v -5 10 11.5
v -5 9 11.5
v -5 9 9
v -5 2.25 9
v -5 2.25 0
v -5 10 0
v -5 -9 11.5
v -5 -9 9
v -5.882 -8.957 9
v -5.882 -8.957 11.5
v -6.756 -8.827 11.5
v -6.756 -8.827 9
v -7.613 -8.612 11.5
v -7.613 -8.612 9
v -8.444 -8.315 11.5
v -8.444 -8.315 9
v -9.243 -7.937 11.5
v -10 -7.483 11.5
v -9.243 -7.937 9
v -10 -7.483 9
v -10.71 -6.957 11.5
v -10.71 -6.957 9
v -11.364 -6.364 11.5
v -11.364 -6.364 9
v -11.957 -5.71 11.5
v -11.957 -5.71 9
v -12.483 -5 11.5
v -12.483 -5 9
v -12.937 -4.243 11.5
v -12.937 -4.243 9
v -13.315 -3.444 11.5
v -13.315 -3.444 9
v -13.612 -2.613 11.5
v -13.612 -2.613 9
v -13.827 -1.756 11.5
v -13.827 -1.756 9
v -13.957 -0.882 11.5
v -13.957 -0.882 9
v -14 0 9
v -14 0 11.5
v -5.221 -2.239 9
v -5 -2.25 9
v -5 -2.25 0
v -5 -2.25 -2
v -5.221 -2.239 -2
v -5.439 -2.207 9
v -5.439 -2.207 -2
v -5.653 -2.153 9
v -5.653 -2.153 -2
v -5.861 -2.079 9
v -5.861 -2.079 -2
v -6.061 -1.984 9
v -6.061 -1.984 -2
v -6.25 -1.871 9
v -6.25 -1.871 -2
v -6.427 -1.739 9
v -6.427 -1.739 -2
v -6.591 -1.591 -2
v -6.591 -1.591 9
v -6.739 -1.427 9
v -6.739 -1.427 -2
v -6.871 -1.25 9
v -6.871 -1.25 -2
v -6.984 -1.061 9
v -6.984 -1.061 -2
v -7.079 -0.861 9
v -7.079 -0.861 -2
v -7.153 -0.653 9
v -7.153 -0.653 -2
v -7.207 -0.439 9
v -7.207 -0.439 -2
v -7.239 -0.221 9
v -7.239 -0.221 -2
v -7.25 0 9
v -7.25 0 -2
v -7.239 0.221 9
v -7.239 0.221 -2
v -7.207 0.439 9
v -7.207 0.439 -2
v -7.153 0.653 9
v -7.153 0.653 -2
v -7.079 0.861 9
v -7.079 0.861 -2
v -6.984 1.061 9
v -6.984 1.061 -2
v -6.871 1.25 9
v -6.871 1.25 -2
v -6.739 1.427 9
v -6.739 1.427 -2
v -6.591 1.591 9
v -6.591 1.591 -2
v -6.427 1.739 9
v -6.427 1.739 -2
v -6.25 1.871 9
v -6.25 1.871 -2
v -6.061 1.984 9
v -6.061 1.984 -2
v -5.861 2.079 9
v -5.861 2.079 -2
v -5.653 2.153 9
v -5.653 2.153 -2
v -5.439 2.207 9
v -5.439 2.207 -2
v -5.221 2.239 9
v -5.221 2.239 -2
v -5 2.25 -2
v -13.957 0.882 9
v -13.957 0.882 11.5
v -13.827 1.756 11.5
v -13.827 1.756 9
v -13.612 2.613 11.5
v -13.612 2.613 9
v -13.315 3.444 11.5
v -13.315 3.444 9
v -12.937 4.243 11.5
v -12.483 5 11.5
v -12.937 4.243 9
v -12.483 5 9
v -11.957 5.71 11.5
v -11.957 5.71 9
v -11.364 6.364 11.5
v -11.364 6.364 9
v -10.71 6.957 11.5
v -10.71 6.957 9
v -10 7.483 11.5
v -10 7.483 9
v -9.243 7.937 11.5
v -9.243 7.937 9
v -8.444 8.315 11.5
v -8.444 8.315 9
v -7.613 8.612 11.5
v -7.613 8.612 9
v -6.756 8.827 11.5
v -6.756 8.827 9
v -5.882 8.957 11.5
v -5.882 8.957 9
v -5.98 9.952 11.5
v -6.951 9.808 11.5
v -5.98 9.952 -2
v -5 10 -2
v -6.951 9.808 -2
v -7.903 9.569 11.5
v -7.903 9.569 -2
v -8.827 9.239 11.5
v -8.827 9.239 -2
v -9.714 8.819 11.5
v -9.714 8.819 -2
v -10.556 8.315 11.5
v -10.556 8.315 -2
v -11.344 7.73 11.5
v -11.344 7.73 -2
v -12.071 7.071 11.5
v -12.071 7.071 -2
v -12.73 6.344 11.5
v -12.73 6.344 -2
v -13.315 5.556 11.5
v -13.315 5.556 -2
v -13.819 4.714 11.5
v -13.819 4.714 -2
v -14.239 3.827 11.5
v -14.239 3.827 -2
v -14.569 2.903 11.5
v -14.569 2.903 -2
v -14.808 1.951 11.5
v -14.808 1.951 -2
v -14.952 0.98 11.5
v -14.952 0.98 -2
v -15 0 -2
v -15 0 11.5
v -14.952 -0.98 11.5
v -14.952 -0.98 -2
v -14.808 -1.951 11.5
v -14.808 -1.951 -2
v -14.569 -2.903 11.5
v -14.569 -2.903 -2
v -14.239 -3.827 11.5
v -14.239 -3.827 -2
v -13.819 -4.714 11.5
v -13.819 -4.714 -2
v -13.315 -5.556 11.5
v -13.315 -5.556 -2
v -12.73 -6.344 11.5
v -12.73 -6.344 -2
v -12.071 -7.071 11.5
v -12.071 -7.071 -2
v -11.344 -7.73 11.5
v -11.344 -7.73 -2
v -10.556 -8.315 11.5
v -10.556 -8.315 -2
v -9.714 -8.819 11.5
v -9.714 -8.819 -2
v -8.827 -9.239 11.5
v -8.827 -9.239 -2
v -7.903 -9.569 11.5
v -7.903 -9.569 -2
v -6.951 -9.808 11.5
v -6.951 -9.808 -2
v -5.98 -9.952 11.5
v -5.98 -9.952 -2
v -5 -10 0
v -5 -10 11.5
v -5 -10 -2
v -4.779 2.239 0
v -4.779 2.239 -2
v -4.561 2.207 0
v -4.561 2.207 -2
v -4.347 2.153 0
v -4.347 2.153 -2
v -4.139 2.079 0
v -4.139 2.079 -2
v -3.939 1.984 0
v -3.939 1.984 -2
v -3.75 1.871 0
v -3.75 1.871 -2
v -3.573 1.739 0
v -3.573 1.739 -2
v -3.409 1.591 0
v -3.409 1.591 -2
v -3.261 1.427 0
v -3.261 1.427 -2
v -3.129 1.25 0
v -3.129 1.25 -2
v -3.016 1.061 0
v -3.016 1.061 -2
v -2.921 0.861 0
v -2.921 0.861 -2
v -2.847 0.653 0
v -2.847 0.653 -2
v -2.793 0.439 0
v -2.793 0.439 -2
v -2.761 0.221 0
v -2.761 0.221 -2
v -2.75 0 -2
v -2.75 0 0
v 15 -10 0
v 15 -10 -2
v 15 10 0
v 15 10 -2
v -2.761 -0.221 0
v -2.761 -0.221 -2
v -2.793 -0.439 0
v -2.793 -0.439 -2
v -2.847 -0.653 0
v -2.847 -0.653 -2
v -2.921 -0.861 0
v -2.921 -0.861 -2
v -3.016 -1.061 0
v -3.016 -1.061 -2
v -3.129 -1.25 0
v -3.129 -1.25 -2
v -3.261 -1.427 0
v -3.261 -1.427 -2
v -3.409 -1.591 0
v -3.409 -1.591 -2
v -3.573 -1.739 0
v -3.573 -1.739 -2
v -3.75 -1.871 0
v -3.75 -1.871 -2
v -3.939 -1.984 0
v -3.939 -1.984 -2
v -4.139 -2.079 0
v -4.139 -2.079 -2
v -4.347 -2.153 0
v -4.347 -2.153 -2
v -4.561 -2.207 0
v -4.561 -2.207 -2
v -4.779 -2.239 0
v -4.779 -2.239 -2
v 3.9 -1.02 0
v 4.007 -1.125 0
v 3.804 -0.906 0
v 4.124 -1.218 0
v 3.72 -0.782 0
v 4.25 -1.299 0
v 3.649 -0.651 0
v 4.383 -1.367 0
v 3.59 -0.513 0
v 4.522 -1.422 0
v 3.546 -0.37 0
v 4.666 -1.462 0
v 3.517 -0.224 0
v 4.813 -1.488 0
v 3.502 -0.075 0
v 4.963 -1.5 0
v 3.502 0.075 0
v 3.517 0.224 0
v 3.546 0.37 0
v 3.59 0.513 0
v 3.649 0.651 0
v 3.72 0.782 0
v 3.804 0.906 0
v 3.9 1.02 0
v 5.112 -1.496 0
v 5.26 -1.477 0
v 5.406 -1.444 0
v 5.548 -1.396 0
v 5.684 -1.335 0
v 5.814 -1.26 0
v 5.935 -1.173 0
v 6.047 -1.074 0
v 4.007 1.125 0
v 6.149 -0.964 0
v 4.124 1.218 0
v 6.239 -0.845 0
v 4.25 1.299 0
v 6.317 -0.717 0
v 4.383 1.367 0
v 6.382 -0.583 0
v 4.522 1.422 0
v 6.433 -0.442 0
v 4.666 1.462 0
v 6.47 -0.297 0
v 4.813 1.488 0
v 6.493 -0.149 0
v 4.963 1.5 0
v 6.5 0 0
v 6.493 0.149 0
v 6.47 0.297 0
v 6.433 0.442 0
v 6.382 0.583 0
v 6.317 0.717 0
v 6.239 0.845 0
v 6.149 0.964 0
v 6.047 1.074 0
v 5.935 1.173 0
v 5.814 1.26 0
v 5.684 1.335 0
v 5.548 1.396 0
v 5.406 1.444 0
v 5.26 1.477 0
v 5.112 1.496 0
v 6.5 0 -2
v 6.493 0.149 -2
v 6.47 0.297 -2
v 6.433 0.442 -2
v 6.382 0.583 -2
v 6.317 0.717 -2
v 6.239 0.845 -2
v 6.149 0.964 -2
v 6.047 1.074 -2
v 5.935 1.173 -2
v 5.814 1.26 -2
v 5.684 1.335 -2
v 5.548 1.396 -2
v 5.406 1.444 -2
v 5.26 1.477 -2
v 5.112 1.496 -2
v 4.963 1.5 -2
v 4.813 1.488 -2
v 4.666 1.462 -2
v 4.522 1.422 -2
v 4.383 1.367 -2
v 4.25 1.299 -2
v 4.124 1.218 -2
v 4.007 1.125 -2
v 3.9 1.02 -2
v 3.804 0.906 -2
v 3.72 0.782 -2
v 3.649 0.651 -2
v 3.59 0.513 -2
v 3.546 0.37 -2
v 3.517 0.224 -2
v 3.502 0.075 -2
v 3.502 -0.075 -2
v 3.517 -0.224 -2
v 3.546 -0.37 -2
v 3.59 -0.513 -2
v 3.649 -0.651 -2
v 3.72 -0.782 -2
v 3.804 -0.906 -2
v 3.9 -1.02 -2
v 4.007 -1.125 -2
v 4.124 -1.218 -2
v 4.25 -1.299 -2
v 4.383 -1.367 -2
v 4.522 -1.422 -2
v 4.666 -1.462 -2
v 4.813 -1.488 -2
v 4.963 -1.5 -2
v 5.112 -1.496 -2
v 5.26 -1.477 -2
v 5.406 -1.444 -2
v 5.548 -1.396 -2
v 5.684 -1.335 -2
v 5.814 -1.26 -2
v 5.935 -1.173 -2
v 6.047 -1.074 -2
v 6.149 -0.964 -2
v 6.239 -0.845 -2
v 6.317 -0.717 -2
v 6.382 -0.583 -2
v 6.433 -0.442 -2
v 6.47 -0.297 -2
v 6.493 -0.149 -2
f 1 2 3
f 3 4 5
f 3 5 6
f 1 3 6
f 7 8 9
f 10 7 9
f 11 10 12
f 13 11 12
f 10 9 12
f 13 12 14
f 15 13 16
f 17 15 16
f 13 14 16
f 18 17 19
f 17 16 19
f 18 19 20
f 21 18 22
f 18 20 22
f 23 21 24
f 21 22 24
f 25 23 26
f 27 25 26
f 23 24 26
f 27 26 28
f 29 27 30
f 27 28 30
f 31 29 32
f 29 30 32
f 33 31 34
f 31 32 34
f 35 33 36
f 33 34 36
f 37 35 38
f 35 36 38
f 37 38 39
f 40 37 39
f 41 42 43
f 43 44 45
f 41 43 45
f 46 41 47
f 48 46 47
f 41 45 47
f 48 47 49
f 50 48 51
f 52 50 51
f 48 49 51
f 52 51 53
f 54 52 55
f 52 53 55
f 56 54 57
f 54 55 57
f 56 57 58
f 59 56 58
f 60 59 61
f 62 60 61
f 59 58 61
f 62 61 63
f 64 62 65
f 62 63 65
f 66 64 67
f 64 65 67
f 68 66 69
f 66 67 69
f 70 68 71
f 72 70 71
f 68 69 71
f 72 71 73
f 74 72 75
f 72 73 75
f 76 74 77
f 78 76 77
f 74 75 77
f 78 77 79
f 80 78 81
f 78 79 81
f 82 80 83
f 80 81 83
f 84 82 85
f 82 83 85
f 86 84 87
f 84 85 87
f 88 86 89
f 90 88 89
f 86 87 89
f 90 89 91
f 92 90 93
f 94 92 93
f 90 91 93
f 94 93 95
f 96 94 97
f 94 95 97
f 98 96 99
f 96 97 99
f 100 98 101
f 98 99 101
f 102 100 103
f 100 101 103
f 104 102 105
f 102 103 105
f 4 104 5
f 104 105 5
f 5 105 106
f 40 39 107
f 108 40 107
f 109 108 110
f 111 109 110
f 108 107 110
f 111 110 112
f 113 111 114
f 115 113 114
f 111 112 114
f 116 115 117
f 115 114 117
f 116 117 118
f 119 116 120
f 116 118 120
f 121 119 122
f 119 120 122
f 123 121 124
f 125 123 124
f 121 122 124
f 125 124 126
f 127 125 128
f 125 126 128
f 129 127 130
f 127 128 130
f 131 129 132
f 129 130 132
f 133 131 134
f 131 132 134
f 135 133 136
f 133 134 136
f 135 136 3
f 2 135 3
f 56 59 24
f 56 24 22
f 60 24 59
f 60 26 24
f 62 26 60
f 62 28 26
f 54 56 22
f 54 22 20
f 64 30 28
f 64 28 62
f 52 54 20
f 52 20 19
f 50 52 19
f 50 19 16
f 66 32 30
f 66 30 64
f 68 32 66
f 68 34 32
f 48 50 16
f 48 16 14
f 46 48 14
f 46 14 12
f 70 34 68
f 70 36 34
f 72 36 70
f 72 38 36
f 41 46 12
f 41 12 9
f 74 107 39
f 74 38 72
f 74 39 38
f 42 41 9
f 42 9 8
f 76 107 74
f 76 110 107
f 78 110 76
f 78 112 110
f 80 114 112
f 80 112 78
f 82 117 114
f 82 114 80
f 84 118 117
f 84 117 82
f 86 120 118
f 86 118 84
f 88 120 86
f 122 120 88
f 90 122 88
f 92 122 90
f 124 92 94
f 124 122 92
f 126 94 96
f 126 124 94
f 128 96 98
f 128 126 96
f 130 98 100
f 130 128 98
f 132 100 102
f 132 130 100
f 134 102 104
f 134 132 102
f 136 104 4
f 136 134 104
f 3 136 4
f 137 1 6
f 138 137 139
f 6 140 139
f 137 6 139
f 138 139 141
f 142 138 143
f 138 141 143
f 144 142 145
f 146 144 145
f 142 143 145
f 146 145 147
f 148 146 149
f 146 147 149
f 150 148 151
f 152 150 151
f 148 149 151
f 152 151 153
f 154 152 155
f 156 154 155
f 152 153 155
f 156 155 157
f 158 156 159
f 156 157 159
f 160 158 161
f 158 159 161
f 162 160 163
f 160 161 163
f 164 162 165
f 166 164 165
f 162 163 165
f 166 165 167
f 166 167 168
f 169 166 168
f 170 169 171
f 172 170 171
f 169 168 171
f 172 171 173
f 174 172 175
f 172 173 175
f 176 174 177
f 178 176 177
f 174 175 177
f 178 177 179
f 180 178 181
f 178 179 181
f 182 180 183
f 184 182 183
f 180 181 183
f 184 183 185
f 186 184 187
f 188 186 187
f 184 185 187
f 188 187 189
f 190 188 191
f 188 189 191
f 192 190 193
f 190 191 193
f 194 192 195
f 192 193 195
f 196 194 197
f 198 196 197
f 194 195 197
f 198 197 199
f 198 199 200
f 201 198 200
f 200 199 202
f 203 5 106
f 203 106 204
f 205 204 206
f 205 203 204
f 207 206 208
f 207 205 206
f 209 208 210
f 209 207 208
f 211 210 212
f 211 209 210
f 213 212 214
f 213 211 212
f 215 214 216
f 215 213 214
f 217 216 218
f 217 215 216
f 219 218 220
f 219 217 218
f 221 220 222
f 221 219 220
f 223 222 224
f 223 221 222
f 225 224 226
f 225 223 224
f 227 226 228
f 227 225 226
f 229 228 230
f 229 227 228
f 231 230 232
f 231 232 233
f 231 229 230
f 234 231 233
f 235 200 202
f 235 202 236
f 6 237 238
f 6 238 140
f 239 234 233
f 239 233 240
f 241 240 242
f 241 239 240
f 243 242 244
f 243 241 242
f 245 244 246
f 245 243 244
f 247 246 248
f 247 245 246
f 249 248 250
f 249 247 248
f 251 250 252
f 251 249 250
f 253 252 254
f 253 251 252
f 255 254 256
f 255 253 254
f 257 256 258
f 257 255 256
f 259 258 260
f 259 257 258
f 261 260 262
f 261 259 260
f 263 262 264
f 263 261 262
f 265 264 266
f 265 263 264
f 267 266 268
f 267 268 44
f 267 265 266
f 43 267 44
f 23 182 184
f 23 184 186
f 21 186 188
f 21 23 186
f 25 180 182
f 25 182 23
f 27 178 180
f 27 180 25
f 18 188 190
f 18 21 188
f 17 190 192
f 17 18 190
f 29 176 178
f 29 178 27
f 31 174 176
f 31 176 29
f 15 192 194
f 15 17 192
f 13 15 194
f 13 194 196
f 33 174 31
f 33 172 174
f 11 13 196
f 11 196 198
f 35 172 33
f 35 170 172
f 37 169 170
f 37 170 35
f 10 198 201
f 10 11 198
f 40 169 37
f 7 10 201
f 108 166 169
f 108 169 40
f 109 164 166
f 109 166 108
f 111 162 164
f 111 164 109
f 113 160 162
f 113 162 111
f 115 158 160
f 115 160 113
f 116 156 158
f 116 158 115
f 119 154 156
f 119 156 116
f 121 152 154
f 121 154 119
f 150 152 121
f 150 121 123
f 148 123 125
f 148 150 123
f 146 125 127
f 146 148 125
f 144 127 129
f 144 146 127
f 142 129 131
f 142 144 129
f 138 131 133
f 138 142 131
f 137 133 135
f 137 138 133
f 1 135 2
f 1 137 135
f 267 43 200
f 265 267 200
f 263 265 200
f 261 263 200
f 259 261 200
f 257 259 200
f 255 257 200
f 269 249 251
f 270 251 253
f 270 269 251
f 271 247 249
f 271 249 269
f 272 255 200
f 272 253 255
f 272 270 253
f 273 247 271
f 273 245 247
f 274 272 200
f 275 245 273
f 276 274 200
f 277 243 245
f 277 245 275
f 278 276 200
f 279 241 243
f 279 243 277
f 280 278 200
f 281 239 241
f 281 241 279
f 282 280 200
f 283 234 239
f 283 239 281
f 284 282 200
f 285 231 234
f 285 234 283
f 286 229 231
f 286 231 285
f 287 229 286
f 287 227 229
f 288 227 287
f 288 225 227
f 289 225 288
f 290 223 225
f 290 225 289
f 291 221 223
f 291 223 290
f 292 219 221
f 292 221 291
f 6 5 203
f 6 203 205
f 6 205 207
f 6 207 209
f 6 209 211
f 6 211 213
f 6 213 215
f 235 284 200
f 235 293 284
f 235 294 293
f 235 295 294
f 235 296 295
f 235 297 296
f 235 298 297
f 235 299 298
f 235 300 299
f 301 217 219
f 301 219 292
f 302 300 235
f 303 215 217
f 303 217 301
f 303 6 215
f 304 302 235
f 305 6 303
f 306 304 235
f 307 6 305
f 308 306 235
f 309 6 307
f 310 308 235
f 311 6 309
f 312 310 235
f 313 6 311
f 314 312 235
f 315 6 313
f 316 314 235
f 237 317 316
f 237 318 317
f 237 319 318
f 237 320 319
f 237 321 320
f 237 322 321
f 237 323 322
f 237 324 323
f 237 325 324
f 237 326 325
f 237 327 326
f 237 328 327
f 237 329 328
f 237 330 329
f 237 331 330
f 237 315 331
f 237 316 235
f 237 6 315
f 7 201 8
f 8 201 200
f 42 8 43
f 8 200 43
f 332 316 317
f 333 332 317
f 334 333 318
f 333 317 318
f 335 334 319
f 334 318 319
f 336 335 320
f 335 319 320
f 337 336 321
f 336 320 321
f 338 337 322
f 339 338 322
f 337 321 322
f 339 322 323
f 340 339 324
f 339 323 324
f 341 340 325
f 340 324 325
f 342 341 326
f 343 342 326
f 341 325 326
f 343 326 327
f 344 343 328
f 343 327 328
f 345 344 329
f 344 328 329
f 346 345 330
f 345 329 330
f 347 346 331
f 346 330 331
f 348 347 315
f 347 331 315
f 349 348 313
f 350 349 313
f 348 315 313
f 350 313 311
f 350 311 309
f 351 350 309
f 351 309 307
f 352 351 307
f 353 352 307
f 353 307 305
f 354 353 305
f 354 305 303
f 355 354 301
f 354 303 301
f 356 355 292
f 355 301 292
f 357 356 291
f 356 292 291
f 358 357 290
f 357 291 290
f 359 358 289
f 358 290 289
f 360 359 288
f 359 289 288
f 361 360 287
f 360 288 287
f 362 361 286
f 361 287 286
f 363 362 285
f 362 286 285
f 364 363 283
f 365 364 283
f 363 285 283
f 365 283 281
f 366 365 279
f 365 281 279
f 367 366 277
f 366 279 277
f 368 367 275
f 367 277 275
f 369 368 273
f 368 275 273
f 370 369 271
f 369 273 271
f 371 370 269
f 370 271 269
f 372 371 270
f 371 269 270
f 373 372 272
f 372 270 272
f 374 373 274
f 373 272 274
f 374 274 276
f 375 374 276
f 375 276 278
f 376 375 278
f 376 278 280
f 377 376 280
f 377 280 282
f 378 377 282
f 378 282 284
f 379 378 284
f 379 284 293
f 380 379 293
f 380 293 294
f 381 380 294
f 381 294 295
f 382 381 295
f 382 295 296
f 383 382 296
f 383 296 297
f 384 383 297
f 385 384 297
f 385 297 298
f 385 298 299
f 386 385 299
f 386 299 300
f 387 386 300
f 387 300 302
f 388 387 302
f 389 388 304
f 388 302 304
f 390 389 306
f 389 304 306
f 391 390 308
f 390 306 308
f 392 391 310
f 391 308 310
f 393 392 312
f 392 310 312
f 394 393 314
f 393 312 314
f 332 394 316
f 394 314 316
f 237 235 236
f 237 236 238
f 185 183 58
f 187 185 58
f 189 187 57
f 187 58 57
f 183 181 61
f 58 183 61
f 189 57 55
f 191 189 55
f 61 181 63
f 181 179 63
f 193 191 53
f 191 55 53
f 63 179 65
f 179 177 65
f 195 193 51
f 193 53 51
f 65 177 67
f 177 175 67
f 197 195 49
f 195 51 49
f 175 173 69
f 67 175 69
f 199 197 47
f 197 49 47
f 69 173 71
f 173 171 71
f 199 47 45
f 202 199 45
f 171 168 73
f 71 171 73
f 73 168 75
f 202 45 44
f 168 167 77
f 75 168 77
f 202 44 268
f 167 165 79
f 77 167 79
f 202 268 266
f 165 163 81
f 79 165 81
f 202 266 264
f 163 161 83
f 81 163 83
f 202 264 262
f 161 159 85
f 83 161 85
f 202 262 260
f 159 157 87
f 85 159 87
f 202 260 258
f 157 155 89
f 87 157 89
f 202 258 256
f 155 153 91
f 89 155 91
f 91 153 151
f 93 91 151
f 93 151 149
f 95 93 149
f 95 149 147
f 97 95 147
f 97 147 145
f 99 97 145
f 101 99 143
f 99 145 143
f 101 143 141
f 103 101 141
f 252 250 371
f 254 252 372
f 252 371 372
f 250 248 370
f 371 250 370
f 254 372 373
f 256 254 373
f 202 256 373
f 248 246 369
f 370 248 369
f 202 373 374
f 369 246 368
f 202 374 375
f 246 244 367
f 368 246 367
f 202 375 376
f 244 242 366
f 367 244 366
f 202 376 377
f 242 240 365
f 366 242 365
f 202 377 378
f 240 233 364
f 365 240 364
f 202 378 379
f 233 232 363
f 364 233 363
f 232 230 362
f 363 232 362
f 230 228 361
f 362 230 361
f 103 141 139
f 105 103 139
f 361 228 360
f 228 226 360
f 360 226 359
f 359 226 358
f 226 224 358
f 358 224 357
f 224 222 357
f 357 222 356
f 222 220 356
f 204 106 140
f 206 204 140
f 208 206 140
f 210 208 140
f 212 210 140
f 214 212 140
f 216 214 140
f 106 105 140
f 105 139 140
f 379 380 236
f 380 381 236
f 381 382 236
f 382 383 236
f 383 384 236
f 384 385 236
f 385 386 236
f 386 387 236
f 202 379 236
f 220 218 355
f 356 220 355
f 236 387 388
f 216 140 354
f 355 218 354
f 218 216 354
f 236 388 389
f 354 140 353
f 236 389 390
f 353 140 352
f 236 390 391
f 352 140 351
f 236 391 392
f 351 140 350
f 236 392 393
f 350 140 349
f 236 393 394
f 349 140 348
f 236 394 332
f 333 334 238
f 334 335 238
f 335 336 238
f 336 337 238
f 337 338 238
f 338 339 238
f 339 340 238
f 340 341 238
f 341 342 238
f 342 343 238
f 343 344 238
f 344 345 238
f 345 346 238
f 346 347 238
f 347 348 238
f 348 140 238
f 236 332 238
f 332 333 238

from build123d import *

# Parameters (mm, degrees)
F0_R     = 1.5
F1_DEPTH = 2
F2_DEPTH = 9
F4_DEPTH = 2.5


with BuildPart() as f1:
    # F0 (on Top) → F1 (new body)
    with BuildSketch(Plane.XY):
        with BuildLine():
            Line((-5, -10), (15, -10))
            Line((15, -10), (15, 10))
            Line((15, 10), (-5, 10))
            Line((-5, 10), (-5, 9))
            Line((-5, 9), (-5, 2.25))
            ThreePointArc((-5, 2.25), (-3.40901, 1.59099), (-2.75, 0))
            ThreePointArc((-2.75, 0), (-3.40901, -1.59099), (-5, -2.25))
            Line((-5, -2.25), (-5, -9))
            Line((-5, -9), (-5, -10))
        make_face()
        with Locations((5, 0)):
            Circle(F0_R, mode=Mode.SUBTRACT)
        with BuildLine():
            ThreePointArc((-15, 0), (-12.071068, -7.071068), (-5, -10))
            Line((-5, -10), (-5, -9))
            ThreePointArc((-5, -9), (-11.363961, -6.363961), (-14, 0))
            ThreePointArc((-14, 0), (-11.363961, 6.363961), (-5, 9))
            Line((-5, 9), (-5, 10))
            ThreePointArc((-5, 10), (-12.071068, 7.071068), (-15, 0))
        make_face()
        with BuildLine():
            ThreePointArc((-14, 0), (-11.363961, -6.363961), (-5, -9))
            Line((-5, -9), (-5, -2.25))
            ThreePointArc((-5, -2.25), (-7.25, 0), (-5, 2.25))
            Line((-5, 2.25), (-5, 9))
            ThreePointArc((-5, 9), (-11.363961, 6.363961), (-14, 0))
        make_face()
    extrude(amount=-F1_DEPTH)

    # F0 (on Top) → F2 (join)
    with BuildSketch(Plane.XY):
        with BuildLine():
            ThreePointArc((-14, 0), (-11.363961, -6.363961), (-5, -9))
            Line((-5, -9), (-5, -2.25))
            ThreePointArc((-5, -2.25), (-7.25, 0), (-5, 2.25))
            Line((-5, 2.25), (-5, 9))
            ThreePointArc((-5, 9), (-11.363961, 6.363961), (-14, 0))
        make_face()
        with BuildLine():
            ThreePointArc((-15, 0), (-12.071068, -7.071068), (-5, -10))
            Line((-5, -10), (-5, -9))
            ThreePointArc((-5, -9), (-11.363961, -6.363961), (-14, 0))
            ThreePointArc((-14, 0), (-11.363961, 6.363961), (-5, 9))
            Line((-5, 9), (-5, 10))
            ThreePointArc((-5, 10), (-12.071068, 7.071068), (-15, 0))
        make_face()
    extrude(amount=F2_DEPTH)

    # F3 (on face) → F4 (join)
    with BuildSketch(Plane.XY.offset(9)):
        with BuildLine():
            Line((-5, 9), (-5, 10))
            ThreePointArc((-5, 10), (-12.071068, 7.071068), (-15, 0))
            ThreePointArc((-15, 0), (-12.071068, -7.071068), (-5, -10))
            Line((-5, -10), (-5, -9))
            ThreePointArc((-5, -9), (-11.363961, -6.363961), (-14, 0))
            ThreePointArc((-14, 0), (-11.363961, 6.363961), (-5, 9))
        make_face()
    extrude(amount=F4_DEPTH)


solid = f1.part
